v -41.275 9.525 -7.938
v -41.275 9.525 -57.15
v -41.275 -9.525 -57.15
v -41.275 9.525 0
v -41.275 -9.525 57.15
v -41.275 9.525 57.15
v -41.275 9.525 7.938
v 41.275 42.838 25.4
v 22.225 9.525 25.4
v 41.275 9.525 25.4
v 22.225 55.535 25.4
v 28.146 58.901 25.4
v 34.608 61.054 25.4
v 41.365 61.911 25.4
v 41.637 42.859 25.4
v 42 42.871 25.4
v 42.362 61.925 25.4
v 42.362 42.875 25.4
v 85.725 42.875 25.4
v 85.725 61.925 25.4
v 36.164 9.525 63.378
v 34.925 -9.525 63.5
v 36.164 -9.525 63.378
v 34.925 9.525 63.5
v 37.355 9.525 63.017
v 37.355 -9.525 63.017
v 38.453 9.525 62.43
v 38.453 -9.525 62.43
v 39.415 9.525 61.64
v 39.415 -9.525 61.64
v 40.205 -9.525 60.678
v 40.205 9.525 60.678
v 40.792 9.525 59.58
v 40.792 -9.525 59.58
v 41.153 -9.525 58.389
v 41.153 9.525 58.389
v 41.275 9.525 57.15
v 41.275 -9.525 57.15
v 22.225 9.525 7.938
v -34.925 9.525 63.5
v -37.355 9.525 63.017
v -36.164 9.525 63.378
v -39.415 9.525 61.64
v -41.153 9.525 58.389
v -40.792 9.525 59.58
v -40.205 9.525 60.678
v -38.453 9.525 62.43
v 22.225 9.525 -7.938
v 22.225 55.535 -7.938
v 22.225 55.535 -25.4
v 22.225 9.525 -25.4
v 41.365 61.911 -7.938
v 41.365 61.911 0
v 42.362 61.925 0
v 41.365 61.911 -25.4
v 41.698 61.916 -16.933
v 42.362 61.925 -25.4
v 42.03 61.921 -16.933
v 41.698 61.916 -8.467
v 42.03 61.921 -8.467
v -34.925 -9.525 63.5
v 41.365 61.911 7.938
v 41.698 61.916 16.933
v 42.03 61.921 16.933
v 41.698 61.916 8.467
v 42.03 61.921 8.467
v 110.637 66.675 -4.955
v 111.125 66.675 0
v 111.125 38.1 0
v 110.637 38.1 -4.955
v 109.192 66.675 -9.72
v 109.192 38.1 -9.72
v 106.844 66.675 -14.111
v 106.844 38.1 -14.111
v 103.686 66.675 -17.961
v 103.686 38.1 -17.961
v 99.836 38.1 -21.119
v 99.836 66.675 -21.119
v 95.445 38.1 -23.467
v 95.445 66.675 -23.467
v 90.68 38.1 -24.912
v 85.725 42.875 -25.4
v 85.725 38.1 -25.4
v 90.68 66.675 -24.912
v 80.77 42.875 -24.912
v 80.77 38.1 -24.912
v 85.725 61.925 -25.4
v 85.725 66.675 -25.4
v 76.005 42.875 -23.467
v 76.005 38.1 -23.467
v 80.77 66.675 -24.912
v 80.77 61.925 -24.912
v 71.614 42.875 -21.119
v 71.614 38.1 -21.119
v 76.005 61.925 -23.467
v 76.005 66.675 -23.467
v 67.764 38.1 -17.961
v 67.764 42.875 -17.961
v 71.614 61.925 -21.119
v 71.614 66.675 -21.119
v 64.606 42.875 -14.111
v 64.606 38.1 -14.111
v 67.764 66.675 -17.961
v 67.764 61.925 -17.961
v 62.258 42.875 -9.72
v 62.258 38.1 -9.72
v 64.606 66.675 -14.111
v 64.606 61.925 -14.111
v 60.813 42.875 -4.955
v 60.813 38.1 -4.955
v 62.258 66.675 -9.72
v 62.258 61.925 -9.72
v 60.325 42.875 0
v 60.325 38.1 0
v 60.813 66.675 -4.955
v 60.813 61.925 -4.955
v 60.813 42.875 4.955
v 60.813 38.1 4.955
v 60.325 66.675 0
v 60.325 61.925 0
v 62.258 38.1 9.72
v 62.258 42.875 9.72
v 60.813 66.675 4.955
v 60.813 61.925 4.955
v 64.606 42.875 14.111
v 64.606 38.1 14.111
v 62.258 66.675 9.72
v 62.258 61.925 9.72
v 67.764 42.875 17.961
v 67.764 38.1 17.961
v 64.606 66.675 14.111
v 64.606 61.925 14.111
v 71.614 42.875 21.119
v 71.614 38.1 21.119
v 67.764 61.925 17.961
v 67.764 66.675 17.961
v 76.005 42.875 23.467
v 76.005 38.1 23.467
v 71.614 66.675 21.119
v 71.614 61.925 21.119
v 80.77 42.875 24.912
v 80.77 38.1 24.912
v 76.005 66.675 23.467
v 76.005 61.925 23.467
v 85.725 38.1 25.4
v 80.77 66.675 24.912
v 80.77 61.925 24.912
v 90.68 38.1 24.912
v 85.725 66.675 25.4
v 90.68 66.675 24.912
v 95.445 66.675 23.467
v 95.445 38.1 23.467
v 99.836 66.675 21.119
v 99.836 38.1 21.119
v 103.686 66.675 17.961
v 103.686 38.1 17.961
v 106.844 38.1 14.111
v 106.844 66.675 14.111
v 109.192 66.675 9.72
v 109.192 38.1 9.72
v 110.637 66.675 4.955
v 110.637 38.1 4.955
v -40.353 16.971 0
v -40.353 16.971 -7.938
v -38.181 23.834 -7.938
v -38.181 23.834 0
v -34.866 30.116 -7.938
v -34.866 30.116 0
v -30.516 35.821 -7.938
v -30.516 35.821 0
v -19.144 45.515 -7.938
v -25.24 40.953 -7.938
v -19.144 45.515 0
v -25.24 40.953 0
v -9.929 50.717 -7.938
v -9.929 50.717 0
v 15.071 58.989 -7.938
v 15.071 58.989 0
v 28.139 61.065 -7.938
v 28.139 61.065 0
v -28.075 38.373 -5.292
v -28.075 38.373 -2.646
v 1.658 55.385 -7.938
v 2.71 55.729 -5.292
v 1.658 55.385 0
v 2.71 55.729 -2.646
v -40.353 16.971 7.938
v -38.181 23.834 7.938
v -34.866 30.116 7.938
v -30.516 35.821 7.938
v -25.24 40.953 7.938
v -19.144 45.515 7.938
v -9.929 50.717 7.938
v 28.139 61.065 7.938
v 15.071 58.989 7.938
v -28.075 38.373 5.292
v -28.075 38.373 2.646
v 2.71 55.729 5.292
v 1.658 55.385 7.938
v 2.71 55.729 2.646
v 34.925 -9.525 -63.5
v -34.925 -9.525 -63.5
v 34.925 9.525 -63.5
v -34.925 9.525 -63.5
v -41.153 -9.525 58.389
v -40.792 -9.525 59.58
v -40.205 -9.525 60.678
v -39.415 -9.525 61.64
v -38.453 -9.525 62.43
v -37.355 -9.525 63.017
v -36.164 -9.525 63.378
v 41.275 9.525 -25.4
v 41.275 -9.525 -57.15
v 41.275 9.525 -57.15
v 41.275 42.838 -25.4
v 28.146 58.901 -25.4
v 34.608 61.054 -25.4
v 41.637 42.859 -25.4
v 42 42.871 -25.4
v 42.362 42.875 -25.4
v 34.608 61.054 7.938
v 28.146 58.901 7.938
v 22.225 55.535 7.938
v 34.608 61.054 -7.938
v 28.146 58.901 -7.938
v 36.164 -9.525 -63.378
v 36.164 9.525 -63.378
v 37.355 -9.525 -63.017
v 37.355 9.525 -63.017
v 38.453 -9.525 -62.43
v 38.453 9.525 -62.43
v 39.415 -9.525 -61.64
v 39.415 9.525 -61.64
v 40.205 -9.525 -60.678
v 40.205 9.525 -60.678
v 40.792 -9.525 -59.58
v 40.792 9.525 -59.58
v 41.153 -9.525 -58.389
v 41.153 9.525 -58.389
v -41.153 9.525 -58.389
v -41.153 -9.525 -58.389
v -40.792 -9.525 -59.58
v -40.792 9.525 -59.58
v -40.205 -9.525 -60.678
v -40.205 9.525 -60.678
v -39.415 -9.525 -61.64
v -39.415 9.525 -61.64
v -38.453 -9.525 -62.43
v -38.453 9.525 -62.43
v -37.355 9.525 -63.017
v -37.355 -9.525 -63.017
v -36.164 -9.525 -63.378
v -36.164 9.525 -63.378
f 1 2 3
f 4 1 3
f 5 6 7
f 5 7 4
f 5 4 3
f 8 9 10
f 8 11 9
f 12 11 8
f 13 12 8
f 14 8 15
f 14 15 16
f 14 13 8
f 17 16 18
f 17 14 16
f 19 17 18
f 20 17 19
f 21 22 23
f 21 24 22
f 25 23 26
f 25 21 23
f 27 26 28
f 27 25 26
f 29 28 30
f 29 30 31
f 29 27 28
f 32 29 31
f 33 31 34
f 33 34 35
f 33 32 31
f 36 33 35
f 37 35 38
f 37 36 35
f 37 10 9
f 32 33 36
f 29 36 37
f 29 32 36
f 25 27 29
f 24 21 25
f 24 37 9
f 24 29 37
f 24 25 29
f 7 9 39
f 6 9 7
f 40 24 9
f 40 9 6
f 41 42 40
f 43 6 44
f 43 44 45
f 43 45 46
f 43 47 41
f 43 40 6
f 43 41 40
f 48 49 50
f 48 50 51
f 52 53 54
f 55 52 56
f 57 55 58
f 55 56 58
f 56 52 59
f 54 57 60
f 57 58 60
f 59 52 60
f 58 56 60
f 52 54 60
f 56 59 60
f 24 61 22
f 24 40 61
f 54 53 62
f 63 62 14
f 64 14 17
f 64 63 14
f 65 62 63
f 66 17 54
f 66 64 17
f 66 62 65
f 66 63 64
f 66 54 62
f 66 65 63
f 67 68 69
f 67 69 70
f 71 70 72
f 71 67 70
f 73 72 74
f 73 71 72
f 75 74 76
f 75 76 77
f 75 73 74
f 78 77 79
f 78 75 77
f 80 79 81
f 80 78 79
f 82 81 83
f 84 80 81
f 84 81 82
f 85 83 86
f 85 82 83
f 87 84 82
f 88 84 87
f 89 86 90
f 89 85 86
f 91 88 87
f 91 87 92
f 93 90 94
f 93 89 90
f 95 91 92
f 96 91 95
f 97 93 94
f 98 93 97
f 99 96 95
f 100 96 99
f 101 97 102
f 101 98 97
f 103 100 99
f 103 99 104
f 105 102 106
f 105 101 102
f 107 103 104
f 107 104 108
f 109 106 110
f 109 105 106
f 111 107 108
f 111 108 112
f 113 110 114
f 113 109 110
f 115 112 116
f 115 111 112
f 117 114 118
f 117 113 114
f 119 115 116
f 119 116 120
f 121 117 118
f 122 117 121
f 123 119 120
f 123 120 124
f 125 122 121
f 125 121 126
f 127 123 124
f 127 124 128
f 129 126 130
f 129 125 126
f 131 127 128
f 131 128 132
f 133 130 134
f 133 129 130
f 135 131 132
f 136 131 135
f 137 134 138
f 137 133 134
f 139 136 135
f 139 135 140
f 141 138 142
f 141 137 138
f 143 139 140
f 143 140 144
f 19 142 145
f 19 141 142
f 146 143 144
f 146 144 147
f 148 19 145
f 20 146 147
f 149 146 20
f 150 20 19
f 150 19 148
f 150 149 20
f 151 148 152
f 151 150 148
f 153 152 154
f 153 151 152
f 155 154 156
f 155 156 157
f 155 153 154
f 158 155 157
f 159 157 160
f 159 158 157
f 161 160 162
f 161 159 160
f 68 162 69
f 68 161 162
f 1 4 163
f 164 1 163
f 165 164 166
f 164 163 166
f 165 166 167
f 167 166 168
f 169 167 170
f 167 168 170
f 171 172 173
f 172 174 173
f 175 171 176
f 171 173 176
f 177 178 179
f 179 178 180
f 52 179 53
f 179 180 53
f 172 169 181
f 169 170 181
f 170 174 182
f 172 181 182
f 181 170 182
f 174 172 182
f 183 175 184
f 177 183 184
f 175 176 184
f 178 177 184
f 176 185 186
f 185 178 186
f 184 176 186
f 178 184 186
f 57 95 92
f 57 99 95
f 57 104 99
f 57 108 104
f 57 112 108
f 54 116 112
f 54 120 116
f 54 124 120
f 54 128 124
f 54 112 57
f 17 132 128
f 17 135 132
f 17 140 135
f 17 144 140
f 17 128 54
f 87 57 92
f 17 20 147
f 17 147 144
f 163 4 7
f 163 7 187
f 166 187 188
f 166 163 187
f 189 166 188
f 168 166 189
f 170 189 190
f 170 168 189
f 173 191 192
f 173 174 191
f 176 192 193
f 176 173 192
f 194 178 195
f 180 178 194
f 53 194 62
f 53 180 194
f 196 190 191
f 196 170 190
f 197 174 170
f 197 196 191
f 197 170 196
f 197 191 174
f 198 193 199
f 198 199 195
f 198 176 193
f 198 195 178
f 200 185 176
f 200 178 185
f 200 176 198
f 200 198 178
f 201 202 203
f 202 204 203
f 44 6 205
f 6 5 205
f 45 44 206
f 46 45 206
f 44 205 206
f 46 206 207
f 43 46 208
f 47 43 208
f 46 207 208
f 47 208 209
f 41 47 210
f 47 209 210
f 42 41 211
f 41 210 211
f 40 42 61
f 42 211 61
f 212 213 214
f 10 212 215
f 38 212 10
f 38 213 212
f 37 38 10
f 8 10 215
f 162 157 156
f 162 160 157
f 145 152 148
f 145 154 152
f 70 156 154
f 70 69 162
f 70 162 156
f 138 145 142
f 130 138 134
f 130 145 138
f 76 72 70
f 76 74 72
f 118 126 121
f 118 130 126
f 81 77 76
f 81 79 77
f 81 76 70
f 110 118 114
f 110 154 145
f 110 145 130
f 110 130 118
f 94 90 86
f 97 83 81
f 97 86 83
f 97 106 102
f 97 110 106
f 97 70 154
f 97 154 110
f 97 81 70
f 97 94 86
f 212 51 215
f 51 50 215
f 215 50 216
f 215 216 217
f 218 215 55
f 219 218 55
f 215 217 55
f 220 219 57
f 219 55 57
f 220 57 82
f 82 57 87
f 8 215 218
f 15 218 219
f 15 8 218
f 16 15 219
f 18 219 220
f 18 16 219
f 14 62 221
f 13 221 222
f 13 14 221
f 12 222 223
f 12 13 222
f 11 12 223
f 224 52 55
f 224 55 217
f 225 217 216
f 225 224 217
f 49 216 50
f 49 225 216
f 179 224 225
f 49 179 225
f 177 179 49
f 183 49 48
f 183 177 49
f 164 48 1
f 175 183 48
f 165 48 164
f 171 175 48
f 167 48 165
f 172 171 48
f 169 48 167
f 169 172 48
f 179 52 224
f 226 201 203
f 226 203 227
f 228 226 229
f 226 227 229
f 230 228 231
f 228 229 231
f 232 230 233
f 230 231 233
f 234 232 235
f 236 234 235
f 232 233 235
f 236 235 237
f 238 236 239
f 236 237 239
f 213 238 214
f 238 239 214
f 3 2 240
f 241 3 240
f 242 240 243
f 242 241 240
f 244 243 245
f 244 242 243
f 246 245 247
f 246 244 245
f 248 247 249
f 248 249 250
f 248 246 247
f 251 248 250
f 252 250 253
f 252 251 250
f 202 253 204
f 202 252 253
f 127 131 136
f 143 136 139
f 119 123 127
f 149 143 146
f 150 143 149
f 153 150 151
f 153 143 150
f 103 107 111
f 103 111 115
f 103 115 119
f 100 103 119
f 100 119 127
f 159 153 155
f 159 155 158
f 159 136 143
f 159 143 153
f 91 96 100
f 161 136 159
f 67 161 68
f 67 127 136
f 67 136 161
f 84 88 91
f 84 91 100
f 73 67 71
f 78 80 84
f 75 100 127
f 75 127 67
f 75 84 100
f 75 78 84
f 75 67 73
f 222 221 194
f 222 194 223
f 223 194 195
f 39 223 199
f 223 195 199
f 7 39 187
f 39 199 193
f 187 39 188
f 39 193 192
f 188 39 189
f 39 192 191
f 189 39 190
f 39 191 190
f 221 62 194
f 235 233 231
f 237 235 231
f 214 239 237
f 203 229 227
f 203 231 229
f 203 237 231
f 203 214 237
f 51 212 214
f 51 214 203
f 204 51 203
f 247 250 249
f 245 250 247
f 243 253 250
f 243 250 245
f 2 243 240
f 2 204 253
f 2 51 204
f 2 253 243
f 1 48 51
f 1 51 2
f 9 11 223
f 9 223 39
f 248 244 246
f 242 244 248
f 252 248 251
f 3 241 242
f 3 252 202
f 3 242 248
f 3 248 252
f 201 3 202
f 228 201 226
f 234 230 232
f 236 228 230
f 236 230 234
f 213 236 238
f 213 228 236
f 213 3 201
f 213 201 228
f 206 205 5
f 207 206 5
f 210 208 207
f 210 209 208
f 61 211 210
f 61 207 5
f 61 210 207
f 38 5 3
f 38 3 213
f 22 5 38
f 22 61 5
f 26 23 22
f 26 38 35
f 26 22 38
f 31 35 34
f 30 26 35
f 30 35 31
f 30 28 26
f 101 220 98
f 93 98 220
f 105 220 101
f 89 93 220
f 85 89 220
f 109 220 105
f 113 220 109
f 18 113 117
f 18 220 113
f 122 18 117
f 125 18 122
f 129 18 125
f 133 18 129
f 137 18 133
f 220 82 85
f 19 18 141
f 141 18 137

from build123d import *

# Parameters (mm, degrees)
F1_DEPTH = 63.5
F0_W     = 25.4
F0_H     = 19.05
F2_DEPTH = 25.4
F3_DEPTH = 7.9375
F4_R     = 6.35


with BuildPart() as f1:
    # F0 (on Top) → F1 (new body, symmetric)
    with BuildSketch(Plane.XY):
        Polygon((-41.275, -9.525), (41.275, -9.525), (41.275, 9.525), (22.225, 9.525), (-41.275, 9.525), align=None)
    extrude(amount=F1_DEPTH, both=True)

    # F0 (on Top) → F2 (join, symmetric)
    with BuildSketch(Plane.XY):
        with BuildLine():
            Line((22.225, 9.525), (41.275, 9.525))
            Line((41.275, 9.525), (41.275, 42.8379135305))
            ThreePointArc((41.275, 42.8379135305), (41.8183842247, 42.8658756442), (42.3624075254, 42.8752))
            Line((42.3624075254, 42.8752), (60.325, 42.8752))
            Line((60.325, 42.8752), (60.325, 61.9252))
            Line((60.325, 61.9252), (42.3624075254, 61.9252))
            add(Edge.make_bspline(
                [(41.3653767795, 61.9109655988), (41.6979264338, 61.916873269), (42.0302788073, 61.9216177836), (42.3624075254, 61.9252)],
                knots=[97.8694671613, 97.8694671613, 97.8694671613, 97.8694671613, 98.6964887806, 98.6964887806, 98.6964887806, 98.6964887806], degree=3))
            ThreePointArc((41.3653767795, 61.9109655988), (31.324788218, 60.1351752531), (22.225, 55.5350986883))
            Line((22.225, 55.5350986883), (22.225, 9.525))
        make_face()
        with Locations((73.025, 52.4002)):
            Rectangle(F0_W, F0_H)
    extrude(amount=F2_DEPTH, both=True)

    # F0 (on Top) → F3 (join, symmetric)
    with BuildSketch(Plane.XY):
        with BuildLine():
            add(Edge.make_bspline(
                [(-41.275, 9.525), (-40.1050332587, 44.223586325), (2.0115597622, 61.211853837), (41.3653767795, 61.9109655988)],
                knots=[0, 0, 0, 0, 97.8694671613, 97.8694671613, 97.8694671613, 97.8694671613], degree=3))
            Line((-41.275, 9.525), (22.225, 9.525))
            Line((22.225, 9.525), (22.225, 55.5350986883))
            ThreePointArc((22.225, 55.5350986883), (31.324788218, 60.1351752531), (41.3653767795, 61.9109655988))
        make_face()
    extrude(amount=F3_DEPTH, both=True)

    # F4
    f4_edges = [f1.edges().sort_by_distance(p)[0] for p in [
        (41.275, 0, 63.5),
        (-41.275, 0, 63.5),
        (-41.275, 0, -63.5),
        (41.275, 0, -63.5),
    ]]
    fillet(f4_edges, radius=F4_R)

    # F0 (on Top) → F5 (revolve)
    with BuildSketch(Plane.XY):
        Polygon((85.725, 61.9252), (85.725, 42.8752), (85.725, 38.1), (111.125, 38.1), (111.125, 66.675), (85.725, 66.675), align=None)
    revolve(axis=Axis((85.725, 52.3875, 0), (0, 1, 0)))


solid = f1.part
